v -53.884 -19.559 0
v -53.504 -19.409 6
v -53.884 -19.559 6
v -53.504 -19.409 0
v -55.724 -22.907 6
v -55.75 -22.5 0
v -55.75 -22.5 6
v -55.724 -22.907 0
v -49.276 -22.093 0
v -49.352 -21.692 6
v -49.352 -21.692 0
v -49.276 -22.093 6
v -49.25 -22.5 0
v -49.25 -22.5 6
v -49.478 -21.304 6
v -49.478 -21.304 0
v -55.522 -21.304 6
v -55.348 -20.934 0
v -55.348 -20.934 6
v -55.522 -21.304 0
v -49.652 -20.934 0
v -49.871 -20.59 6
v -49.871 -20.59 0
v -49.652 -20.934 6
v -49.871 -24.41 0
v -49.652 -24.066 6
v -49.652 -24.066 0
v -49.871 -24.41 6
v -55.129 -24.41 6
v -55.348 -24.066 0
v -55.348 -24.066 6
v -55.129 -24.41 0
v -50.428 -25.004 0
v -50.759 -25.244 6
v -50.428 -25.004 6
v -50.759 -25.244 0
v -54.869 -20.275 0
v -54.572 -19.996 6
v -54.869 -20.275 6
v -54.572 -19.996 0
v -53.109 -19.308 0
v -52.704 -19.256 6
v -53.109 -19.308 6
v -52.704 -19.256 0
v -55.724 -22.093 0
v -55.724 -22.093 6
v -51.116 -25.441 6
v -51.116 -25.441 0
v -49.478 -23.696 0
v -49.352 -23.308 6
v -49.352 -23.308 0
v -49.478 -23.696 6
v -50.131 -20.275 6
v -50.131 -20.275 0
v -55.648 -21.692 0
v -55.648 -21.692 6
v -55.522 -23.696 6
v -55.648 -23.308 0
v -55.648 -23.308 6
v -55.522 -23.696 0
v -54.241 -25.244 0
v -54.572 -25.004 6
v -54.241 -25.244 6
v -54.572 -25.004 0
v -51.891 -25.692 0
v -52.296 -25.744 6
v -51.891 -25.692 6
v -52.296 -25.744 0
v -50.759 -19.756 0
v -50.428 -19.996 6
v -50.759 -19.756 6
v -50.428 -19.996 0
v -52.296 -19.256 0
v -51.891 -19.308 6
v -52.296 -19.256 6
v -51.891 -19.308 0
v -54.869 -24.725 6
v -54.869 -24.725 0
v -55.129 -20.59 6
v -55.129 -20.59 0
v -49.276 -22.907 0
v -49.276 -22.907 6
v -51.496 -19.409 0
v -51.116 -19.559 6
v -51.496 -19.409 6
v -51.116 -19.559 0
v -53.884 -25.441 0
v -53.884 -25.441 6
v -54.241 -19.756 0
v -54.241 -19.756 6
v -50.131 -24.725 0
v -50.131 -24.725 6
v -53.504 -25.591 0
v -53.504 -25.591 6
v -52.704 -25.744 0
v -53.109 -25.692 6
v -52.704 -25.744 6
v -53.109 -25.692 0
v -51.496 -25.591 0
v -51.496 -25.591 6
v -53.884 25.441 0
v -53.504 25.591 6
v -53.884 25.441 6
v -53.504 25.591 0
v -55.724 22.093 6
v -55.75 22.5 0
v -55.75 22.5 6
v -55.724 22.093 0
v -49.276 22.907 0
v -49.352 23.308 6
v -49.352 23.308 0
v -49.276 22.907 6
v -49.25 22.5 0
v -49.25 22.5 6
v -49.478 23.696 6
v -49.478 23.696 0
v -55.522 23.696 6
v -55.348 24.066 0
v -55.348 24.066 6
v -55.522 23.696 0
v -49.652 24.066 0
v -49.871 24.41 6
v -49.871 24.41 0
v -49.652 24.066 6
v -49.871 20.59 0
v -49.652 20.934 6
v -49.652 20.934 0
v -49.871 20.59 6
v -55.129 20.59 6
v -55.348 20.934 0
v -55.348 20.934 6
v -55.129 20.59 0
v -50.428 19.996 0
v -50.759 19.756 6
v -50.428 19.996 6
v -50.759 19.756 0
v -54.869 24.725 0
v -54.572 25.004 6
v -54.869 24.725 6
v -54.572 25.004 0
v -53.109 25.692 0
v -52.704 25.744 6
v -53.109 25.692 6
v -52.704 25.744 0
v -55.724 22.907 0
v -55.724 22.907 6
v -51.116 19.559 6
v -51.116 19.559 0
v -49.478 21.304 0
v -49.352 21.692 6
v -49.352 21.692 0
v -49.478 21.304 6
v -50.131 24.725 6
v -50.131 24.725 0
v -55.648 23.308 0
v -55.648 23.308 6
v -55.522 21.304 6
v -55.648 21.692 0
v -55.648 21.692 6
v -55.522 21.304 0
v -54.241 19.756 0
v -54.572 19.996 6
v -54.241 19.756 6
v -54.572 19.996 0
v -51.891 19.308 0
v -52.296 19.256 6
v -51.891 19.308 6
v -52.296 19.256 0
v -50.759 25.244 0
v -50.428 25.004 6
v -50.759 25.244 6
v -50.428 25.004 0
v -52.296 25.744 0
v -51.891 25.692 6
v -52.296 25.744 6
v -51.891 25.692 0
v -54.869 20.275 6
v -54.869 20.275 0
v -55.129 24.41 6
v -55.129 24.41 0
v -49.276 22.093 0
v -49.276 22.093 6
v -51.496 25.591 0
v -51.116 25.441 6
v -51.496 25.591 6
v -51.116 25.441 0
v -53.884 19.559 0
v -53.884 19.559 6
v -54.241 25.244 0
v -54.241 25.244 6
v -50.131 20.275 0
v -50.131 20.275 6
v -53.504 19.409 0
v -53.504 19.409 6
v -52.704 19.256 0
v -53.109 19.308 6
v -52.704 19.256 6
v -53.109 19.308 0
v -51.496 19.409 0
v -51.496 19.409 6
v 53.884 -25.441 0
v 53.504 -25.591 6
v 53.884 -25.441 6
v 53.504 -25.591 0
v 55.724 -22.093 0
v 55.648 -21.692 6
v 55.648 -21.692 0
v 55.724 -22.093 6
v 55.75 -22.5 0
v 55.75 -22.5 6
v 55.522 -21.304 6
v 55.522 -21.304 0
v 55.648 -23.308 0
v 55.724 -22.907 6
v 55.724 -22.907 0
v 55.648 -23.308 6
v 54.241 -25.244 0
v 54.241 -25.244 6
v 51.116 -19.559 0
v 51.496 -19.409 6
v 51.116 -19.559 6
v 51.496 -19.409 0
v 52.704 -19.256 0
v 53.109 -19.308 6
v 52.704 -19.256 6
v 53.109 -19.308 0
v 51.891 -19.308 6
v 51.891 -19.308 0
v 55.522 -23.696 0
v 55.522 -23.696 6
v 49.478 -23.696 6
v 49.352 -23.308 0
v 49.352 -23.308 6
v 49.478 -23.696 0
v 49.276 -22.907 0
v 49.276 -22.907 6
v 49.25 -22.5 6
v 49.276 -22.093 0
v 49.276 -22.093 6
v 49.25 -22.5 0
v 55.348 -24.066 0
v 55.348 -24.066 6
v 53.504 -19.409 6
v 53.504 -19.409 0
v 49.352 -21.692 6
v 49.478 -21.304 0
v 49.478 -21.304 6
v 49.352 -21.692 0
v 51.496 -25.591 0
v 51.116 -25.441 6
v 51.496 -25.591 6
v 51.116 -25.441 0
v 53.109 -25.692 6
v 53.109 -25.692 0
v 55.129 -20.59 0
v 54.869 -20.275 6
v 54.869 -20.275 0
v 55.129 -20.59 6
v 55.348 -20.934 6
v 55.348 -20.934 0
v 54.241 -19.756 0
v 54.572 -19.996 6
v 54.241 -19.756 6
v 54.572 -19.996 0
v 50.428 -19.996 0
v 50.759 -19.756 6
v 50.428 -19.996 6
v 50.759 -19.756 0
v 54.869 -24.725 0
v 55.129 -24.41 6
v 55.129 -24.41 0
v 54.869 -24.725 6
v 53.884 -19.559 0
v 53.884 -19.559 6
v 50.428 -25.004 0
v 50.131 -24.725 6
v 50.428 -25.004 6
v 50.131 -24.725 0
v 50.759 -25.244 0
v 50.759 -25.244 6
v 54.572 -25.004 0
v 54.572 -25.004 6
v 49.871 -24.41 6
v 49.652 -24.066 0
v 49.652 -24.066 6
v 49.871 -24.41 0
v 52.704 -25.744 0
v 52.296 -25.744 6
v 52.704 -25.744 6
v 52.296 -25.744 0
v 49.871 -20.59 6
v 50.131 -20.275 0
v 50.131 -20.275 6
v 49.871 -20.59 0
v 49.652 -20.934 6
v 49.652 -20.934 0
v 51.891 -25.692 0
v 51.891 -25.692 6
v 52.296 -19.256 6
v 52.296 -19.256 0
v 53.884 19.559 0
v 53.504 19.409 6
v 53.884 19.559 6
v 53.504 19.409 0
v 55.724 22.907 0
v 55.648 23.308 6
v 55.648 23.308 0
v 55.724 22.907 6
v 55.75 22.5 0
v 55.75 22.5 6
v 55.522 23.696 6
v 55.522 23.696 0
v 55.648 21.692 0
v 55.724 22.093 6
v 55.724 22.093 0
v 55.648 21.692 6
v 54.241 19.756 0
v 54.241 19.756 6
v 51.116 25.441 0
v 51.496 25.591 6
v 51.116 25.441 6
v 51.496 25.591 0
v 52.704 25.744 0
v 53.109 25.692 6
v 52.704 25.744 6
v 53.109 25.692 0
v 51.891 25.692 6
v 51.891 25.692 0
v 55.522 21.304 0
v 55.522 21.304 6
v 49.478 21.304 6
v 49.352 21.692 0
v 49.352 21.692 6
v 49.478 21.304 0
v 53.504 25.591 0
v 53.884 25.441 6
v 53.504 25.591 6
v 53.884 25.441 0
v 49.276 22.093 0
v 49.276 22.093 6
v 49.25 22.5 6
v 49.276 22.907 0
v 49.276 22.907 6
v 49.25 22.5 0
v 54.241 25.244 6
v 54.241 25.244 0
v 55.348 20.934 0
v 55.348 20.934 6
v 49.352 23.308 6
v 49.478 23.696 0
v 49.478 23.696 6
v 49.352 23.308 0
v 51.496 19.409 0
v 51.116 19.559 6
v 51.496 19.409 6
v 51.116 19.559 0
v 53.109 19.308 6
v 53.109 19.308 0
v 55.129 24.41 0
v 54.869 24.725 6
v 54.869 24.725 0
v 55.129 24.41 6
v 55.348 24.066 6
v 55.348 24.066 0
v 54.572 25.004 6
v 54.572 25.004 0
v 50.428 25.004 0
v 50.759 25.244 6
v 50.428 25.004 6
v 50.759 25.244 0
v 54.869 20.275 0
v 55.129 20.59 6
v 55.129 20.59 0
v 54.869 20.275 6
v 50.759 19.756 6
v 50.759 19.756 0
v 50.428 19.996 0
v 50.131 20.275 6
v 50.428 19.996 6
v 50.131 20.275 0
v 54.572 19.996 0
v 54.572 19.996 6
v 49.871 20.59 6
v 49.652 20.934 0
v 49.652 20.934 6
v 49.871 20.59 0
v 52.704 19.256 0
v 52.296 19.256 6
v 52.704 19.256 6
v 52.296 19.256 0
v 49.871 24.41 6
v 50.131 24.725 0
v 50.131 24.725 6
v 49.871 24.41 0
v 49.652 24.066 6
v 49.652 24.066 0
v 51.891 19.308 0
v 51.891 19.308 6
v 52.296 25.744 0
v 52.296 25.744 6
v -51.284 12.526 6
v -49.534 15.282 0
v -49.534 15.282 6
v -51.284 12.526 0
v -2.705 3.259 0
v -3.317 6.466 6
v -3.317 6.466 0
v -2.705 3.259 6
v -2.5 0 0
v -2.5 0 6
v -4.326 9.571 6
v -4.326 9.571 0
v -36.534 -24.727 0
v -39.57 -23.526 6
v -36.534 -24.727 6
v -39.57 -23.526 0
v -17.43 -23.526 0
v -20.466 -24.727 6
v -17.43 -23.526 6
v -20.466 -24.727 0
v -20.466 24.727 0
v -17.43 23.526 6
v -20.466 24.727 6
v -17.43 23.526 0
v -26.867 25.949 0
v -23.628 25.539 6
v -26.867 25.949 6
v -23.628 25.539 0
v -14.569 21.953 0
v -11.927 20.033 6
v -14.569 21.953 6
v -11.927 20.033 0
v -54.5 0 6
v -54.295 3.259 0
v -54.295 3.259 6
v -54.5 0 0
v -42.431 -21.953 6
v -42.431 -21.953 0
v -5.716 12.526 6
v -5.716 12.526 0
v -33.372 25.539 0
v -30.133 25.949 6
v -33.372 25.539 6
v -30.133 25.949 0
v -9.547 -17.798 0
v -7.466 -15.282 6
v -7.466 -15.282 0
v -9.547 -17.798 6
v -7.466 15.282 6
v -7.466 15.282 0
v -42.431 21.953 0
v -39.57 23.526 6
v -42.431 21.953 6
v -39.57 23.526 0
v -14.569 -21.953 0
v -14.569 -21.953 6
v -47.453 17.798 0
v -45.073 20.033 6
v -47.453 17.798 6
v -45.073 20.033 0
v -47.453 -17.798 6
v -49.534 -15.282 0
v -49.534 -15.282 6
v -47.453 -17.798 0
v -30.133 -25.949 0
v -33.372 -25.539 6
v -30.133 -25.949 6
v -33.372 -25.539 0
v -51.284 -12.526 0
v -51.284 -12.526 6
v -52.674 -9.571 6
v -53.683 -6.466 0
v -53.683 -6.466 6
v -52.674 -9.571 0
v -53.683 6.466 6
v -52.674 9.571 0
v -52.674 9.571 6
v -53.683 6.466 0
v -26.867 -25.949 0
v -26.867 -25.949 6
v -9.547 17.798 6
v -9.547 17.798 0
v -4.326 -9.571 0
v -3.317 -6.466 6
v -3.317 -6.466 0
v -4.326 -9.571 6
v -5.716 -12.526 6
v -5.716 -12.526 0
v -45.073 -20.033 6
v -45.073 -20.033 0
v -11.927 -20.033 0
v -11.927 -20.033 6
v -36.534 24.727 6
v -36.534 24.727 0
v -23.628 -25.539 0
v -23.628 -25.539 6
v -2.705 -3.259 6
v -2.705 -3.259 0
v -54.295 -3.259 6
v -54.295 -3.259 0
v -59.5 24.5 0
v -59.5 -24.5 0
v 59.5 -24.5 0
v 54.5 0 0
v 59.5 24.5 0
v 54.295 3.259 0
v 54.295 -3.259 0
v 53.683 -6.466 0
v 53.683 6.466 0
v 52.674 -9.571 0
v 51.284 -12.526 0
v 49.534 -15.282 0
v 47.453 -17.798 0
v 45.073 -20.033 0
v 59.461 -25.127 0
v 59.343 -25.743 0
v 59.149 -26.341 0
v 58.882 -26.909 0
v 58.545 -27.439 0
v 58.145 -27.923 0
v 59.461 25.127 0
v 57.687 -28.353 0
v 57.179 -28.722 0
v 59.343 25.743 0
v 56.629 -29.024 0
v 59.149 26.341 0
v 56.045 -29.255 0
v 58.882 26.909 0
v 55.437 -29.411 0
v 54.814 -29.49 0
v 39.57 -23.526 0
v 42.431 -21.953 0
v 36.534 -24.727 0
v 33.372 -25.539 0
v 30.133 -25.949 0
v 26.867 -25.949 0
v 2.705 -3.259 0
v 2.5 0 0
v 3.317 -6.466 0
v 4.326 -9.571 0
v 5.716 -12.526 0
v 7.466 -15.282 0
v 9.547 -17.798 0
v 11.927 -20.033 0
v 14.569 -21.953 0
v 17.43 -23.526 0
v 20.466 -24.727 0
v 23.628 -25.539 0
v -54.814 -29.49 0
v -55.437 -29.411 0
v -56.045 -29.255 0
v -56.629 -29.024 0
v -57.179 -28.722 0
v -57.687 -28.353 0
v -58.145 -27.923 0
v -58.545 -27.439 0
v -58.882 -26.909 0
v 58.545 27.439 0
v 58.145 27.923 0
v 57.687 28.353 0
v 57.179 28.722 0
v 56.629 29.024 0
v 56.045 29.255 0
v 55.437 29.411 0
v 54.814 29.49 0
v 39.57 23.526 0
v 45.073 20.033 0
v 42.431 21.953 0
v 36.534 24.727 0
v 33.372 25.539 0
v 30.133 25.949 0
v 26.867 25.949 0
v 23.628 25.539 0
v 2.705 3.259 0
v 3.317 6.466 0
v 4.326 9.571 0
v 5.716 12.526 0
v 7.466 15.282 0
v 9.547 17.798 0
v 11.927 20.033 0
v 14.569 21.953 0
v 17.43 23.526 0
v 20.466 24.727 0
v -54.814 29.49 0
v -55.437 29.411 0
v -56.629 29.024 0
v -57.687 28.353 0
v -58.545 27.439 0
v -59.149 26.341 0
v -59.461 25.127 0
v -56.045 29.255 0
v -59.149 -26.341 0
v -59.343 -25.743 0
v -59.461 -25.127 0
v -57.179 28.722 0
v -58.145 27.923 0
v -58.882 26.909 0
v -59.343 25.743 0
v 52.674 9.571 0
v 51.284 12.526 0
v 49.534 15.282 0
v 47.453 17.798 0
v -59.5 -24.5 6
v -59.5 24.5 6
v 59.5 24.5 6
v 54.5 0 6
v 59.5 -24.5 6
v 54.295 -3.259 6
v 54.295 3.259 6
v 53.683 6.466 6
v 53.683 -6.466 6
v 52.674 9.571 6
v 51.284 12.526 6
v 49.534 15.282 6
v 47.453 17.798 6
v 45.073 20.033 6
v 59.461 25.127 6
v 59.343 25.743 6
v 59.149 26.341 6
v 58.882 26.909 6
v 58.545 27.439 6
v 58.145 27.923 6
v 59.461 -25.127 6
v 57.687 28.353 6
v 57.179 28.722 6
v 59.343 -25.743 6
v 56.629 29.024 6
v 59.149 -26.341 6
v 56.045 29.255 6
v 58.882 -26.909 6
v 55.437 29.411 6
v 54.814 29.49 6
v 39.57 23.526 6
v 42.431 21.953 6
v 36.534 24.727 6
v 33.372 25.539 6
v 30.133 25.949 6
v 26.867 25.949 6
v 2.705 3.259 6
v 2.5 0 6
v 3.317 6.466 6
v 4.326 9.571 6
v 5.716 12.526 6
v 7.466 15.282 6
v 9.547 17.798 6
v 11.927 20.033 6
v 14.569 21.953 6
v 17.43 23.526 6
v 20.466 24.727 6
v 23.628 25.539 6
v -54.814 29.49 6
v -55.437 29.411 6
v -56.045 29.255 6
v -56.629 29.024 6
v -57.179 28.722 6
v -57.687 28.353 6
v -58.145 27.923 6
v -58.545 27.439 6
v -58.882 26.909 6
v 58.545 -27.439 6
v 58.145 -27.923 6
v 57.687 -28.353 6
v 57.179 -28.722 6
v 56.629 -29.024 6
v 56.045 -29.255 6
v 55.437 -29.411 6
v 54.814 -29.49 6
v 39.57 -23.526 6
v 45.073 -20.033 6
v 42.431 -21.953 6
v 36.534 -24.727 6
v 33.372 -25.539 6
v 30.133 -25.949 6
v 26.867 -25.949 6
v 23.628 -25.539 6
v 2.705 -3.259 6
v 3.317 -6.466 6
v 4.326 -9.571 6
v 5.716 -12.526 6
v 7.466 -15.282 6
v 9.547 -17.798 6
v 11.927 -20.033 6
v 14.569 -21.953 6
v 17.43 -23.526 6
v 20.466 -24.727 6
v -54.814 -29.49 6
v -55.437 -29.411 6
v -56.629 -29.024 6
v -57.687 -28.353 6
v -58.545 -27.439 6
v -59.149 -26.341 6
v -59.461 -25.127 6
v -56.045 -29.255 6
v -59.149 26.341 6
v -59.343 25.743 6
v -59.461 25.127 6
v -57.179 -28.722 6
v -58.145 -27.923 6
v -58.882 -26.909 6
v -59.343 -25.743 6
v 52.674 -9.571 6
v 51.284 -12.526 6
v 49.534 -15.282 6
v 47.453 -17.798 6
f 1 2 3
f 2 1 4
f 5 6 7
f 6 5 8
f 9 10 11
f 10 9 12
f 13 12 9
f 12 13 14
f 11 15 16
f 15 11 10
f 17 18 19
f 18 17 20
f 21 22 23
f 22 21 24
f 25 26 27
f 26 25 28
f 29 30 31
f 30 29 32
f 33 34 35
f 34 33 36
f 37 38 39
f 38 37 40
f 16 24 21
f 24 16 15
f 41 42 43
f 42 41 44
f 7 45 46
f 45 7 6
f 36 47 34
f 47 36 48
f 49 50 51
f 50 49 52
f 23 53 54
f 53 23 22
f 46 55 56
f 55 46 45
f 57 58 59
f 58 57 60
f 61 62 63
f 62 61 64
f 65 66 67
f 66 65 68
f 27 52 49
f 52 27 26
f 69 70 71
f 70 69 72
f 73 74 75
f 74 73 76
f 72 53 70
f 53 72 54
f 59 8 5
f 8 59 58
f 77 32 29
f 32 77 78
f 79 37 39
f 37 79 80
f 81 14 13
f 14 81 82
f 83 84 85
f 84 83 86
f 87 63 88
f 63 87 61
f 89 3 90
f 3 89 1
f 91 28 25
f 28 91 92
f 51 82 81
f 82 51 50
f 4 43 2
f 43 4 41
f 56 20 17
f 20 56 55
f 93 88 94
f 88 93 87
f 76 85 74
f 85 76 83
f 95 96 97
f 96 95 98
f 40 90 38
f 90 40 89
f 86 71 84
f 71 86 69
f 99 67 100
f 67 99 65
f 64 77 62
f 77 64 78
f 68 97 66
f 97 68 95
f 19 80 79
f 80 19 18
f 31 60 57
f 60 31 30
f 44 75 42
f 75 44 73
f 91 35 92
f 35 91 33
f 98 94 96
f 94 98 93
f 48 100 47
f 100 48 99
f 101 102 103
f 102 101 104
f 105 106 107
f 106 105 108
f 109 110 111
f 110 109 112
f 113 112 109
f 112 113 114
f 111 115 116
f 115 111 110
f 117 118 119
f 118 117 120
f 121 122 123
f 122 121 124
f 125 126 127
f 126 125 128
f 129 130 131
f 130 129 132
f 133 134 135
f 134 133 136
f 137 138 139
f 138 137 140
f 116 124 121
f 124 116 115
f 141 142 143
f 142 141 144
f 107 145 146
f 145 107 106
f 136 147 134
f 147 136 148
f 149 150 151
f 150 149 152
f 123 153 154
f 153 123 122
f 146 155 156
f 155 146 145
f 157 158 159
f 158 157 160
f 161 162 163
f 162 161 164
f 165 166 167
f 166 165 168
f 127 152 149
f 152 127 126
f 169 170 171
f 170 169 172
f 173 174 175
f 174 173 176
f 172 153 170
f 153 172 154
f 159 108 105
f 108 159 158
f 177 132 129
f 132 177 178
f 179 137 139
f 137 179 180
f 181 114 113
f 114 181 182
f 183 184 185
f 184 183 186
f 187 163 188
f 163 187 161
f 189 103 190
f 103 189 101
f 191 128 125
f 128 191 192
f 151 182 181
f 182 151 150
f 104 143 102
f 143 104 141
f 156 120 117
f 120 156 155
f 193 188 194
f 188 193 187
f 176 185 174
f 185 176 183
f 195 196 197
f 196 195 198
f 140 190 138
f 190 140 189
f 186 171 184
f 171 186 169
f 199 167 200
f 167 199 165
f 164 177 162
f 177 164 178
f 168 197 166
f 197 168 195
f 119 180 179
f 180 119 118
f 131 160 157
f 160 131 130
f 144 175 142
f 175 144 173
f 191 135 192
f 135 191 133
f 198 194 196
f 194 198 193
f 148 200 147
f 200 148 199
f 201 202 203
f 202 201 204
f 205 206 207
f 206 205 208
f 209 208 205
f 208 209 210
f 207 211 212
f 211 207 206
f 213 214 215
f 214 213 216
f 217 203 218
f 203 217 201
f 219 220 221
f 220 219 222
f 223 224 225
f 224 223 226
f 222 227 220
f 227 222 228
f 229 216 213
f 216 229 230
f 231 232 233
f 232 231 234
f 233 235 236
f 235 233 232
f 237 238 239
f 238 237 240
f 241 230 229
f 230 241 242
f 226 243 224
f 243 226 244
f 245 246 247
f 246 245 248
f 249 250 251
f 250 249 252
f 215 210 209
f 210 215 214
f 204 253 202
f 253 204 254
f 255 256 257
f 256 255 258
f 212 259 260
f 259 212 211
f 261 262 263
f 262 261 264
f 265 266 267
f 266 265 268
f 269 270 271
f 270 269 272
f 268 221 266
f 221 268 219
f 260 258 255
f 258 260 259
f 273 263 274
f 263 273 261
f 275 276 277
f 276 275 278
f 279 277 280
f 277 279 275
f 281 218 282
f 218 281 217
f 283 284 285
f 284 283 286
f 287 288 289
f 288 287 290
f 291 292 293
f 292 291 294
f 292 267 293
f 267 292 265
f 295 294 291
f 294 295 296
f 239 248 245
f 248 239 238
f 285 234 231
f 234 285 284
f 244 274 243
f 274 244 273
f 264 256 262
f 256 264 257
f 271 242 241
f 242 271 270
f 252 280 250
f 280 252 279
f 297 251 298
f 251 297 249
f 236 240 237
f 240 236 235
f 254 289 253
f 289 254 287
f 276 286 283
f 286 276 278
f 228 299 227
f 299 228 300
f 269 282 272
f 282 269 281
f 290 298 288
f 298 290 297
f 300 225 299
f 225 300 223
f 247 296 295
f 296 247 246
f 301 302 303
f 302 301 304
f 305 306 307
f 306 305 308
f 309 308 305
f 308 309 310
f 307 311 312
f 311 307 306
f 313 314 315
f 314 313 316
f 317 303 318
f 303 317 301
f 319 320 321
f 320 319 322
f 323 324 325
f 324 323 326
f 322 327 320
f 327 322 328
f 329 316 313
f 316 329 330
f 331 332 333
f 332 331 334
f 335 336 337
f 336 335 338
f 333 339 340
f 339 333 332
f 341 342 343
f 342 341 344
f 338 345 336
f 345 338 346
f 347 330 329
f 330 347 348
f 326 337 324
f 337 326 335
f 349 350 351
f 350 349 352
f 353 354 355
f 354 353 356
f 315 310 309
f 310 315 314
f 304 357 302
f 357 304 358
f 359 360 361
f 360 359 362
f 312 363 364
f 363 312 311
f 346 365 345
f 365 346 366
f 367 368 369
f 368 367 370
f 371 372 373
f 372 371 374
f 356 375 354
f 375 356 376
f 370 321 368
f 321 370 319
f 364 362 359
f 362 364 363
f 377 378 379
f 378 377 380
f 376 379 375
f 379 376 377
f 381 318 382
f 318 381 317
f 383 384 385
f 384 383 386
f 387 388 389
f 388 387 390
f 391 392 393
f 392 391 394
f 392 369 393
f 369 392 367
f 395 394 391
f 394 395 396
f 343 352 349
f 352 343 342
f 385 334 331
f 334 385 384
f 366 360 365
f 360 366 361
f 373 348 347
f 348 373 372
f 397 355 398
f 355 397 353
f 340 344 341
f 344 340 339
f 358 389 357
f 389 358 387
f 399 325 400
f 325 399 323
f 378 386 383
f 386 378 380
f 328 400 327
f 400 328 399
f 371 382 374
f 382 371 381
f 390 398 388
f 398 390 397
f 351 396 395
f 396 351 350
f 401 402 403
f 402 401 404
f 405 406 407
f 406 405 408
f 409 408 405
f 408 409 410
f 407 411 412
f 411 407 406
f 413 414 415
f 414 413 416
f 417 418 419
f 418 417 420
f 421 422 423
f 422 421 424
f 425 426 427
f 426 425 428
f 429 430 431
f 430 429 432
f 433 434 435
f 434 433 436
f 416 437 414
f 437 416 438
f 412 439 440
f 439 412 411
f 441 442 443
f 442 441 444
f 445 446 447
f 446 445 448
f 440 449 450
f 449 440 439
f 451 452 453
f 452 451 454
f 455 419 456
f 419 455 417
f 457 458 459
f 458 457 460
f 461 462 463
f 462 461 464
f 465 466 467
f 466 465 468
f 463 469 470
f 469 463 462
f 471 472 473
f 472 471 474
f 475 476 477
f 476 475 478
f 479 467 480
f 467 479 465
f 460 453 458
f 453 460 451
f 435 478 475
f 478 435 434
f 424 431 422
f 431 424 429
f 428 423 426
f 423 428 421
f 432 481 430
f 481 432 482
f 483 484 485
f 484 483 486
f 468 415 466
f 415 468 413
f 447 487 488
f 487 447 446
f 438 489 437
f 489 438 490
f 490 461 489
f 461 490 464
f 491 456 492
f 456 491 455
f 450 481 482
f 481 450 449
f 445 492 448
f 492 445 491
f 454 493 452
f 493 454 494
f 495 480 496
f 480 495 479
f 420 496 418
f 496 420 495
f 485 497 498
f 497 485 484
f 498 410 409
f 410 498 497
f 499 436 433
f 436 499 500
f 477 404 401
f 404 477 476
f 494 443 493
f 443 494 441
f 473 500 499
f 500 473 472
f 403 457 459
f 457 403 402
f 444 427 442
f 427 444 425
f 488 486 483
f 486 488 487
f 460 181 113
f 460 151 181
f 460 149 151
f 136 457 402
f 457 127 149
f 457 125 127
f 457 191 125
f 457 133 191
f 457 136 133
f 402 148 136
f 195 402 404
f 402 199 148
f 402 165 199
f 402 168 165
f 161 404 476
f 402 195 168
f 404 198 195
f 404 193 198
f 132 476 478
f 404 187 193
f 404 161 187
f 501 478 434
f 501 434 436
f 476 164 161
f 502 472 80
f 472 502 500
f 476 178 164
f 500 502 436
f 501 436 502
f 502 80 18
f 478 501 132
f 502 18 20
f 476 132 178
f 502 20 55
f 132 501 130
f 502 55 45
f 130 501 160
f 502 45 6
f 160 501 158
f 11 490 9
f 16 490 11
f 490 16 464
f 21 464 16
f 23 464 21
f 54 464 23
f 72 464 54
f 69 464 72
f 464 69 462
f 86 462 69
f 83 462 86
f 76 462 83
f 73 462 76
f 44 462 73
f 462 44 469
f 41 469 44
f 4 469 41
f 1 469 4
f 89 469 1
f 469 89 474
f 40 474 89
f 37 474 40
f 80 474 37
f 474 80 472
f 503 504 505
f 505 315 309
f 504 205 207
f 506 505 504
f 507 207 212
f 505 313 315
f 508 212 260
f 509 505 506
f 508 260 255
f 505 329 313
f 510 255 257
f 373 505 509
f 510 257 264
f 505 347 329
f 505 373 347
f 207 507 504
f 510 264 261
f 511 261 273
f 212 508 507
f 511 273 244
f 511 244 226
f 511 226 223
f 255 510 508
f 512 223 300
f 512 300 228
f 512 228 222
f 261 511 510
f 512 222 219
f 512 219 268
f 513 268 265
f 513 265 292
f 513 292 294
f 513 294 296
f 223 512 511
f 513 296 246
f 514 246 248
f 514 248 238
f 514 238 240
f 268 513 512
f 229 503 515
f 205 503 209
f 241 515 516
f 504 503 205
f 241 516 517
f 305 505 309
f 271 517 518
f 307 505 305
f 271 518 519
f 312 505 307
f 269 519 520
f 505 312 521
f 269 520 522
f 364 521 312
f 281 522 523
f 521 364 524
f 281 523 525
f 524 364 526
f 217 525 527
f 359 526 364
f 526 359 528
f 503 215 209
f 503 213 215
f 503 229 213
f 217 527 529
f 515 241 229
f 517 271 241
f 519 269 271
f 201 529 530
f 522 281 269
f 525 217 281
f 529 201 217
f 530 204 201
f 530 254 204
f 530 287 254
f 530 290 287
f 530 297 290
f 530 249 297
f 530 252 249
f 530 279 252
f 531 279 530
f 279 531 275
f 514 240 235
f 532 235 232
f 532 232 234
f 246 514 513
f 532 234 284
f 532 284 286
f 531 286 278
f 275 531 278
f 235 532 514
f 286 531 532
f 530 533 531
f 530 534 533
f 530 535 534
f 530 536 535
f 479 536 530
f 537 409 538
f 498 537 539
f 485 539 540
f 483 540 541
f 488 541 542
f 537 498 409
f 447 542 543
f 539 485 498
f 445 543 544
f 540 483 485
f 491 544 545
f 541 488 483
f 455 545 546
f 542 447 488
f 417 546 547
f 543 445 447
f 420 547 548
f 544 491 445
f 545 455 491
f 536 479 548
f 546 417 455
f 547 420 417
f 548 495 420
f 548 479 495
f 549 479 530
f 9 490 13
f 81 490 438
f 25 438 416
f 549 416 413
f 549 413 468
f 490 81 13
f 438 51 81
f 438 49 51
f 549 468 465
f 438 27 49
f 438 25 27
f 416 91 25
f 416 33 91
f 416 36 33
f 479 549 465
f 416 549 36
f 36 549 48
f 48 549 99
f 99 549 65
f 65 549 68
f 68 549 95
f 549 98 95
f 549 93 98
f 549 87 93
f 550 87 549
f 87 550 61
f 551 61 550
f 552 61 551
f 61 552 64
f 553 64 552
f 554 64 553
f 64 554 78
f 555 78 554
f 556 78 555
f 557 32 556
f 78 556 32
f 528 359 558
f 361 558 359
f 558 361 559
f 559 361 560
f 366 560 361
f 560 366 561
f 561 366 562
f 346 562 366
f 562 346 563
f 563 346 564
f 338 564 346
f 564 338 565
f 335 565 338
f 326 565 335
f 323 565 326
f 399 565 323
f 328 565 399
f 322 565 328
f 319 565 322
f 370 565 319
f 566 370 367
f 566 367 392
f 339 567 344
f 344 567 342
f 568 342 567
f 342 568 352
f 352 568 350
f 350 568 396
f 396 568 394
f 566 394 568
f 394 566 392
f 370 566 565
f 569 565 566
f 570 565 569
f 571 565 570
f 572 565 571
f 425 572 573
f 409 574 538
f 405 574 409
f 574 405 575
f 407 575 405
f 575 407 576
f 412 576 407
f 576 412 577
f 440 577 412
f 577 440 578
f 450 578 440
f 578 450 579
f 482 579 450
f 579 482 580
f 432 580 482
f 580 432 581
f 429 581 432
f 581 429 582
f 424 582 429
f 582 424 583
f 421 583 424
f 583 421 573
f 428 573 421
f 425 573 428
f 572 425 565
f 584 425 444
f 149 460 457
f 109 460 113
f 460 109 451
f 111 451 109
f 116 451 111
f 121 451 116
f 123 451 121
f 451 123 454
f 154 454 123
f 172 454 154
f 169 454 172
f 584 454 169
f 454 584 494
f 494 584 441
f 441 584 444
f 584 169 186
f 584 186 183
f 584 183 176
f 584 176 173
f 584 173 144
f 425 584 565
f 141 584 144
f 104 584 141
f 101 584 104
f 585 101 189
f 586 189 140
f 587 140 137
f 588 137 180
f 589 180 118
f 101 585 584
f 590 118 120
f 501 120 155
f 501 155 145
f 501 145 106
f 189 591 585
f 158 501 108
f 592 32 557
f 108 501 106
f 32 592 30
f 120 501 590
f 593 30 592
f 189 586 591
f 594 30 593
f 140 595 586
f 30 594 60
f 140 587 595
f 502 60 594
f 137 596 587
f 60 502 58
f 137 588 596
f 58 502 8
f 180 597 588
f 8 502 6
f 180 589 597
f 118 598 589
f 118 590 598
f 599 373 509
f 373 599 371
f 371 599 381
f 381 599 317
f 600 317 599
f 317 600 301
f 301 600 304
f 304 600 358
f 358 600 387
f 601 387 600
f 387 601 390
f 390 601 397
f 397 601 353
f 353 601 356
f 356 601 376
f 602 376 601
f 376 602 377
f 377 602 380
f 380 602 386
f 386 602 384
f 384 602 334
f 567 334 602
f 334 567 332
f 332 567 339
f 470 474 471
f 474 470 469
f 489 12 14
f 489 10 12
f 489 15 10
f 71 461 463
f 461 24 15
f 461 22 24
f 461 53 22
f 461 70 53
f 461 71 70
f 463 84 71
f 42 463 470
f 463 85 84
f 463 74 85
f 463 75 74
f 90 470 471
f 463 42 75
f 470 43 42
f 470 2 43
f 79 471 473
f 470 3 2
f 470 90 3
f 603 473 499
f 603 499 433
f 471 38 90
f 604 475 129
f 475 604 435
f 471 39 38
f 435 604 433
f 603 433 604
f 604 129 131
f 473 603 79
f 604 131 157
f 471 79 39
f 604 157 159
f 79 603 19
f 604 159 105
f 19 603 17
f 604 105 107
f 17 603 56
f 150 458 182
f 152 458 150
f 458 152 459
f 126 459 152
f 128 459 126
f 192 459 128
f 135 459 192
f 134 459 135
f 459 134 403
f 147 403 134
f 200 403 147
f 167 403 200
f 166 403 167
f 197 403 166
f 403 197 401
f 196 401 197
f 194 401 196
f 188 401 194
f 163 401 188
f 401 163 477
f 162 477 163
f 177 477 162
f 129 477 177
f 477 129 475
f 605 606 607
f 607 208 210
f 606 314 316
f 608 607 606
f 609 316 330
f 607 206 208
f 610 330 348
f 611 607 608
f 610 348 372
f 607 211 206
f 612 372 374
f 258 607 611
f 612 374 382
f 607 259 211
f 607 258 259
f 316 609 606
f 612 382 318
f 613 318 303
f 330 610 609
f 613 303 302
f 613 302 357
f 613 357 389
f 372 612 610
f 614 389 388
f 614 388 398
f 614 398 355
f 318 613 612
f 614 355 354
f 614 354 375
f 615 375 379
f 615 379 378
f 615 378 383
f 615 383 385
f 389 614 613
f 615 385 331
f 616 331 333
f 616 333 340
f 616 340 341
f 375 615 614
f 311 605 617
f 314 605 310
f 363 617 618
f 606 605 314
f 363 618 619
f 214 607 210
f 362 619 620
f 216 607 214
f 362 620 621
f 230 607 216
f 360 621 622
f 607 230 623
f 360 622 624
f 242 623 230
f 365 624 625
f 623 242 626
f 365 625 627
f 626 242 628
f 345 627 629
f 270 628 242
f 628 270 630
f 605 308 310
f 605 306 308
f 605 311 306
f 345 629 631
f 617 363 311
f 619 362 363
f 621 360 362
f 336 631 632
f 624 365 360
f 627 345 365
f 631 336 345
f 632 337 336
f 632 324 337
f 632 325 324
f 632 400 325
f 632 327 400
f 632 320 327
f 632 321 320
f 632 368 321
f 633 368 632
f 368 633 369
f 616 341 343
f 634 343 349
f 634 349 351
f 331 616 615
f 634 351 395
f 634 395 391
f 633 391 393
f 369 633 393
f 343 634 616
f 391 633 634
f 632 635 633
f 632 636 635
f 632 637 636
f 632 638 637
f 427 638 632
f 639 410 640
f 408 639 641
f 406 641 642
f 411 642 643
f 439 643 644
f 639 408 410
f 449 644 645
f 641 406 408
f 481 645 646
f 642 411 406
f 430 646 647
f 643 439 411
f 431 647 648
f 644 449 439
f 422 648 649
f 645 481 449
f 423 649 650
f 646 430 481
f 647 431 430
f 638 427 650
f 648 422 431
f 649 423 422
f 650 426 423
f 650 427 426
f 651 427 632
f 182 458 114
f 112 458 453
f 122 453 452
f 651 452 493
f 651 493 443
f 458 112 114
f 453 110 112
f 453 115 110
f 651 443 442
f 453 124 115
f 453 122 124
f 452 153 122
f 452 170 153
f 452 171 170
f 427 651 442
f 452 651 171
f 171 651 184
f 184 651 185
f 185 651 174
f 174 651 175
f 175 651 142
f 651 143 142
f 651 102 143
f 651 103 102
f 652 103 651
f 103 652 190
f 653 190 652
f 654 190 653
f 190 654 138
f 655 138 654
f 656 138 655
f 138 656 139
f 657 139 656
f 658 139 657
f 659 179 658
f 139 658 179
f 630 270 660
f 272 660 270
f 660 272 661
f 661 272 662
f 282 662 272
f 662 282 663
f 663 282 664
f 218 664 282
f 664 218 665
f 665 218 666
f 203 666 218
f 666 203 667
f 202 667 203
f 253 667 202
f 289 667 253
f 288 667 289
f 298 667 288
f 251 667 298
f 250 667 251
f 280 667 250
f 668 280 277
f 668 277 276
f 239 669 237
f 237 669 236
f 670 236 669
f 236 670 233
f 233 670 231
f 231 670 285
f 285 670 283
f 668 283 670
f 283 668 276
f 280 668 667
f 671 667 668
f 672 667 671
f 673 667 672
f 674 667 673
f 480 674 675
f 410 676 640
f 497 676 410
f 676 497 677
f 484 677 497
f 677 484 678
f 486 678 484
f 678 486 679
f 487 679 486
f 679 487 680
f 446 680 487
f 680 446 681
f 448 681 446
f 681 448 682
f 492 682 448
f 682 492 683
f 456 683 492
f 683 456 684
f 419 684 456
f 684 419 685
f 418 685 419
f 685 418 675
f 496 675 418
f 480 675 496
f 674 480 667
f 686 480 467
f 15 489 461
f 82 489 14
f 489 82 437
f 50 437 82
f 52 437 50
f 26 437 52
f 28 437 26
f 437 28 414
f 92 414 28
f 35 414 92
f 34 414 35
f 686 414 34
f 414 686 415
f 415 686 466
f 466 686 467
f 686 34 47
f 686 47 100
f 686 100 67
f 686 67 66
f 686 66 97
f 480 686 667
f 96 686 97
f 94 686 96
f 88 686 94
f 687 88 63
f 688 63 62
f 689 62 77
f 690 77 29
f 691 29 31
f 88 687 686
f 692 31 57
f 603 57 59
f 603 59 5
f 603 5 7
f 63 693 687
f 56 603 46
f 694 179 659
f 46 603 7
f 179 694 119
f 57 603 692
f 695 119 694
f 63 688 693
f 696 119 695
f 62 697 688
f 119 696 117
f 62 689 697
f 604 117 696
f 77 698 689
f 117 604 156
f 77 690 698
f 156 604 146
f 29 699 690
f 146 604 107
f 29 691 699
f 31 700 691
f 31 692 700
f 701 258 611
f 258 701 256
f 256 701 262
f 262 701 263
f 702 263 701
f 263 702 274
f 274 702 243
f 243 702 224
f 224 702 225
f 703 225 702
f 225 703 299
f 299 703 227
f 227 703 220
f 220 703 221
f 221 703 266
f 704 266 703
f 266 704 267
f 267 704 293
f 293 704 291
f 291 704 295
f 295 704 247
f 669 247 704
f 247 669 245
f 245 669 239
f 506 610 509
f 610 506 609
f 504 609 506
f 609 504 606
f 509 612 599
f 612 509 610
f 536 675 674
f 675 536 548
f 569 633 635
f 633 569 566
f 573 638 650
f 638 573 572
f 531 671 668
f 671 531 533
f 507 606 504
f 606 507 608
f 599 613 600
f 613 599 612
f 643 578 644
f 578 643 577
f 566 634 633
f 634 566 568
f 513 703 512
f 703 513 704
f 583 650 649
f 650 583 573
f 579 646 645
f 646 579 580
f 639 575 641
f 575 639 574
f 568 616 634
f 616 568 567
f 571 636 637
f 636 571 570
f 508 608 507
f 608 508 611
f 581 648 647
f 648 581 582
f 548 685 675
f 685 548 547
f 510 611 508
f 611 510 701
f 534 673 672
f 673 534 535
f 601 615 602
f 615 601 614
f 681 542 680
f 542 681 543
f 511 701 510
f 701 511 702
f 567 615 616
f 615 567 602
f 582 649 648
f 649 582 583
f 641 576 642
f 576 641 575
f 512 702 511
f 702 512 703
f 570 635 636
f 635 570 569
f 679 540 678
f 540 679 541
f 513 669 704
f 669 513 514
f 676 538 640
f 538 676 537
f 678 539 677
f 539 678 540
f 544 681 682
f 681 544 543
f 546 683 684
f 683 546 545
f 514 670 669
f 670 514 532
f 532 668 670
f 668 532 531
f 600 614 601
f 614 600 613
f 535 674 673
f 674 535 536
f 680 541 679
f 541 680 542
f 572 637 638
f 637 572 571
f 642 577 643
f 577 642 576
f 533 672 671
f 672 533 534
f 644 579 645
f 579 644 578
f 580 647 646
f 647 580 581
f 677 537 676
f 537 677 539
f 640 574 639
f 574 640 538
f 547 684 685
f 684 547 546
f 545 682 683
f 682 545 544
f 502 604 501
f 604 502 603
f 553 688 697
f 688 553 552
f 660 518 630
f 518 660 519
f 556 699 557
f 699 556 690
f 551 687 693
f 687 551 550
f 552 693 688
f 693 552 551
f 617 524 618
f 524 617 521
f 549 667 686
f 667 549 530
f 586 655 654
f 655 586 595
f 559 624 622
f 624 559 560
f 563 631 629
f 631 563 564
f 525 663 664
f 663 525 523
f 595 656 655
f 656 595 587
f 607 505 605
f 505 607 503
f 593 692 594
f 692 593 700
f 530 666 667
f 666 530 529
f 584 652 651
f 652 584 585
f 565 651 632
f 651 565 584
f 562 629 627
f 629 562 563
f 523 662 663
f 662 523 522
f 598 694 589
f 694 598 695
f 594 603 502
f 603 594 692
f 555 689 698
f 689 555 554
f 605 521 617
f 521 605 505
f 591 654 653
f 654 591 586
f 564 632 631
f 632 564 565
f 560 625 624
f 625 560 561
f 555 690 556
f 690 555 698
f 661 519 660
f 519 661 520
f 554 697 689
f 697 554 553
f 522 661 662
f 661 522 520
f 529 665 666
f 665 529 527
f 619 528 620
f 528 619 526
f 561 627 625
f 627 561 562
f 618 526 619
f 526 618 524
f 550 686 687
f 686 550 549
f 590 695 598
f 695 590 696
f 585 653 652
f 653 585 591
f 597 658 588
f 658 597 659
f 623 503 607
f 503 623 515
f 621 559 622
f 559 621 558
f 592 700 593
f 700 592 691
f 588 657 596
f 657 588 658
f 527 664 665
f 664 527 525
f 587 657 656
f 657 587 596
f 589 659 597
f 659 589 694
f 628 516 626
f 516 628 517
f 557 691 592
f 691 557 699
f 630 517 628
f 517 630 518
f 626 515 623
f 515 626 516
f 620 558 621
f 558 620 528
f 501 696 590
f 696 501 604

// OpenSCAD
$fn = 50;


difference() {
	union() {
		hull() {
			translate(v = [-54.5000000000, 24.5000000000, 0]) {
				cylinder(h = 6, r = 5);
			}
			translate(v = [54.5000000000, 24.5000000000, 0]) {
				cylinder(h = 6, r = 5);
			}
			translate(v = [-54.5000000000, -24.5000000000, 0]) {
				cylinder(h = 6, r = 5);
			}
			translate(v = [54.5000000000, -24.5000000000, 0]) {
				cylinder(h = 6, r = 5);
			}
		}
	}
	union() {
		#translate(v = [-52.5000000000, -22.5000000000, -100.0000000000]) {
			cylinder(h = 200, r = 3.2500000000);
		}
		#translate(v = [-52.5000000000, 22.5000000000, -100.0000000000]) {
			cylinder(h = 200, r = 3.2500000000);
		}
		#translate(v = [52.5000000000, -22.5000000000, -100.0000000000]) {
			cylinder(h = 200, r = 3.2500000000);
		}
		#translate(v = [52.5000000000, 22.5000000000, -100.0000000000]) {
			cylinder(h = 200, r = 3.2500000000);
		}
		#translate(v = [-28.5000000000, 0, 0]) {
			cylinder(h = 6, r = 26.0000000000);
		}
		#translate(v = [28.5000000000, 0, 0]) {
			cylinder(h = 6, r = 26.0000000000);
		}
	}
}
